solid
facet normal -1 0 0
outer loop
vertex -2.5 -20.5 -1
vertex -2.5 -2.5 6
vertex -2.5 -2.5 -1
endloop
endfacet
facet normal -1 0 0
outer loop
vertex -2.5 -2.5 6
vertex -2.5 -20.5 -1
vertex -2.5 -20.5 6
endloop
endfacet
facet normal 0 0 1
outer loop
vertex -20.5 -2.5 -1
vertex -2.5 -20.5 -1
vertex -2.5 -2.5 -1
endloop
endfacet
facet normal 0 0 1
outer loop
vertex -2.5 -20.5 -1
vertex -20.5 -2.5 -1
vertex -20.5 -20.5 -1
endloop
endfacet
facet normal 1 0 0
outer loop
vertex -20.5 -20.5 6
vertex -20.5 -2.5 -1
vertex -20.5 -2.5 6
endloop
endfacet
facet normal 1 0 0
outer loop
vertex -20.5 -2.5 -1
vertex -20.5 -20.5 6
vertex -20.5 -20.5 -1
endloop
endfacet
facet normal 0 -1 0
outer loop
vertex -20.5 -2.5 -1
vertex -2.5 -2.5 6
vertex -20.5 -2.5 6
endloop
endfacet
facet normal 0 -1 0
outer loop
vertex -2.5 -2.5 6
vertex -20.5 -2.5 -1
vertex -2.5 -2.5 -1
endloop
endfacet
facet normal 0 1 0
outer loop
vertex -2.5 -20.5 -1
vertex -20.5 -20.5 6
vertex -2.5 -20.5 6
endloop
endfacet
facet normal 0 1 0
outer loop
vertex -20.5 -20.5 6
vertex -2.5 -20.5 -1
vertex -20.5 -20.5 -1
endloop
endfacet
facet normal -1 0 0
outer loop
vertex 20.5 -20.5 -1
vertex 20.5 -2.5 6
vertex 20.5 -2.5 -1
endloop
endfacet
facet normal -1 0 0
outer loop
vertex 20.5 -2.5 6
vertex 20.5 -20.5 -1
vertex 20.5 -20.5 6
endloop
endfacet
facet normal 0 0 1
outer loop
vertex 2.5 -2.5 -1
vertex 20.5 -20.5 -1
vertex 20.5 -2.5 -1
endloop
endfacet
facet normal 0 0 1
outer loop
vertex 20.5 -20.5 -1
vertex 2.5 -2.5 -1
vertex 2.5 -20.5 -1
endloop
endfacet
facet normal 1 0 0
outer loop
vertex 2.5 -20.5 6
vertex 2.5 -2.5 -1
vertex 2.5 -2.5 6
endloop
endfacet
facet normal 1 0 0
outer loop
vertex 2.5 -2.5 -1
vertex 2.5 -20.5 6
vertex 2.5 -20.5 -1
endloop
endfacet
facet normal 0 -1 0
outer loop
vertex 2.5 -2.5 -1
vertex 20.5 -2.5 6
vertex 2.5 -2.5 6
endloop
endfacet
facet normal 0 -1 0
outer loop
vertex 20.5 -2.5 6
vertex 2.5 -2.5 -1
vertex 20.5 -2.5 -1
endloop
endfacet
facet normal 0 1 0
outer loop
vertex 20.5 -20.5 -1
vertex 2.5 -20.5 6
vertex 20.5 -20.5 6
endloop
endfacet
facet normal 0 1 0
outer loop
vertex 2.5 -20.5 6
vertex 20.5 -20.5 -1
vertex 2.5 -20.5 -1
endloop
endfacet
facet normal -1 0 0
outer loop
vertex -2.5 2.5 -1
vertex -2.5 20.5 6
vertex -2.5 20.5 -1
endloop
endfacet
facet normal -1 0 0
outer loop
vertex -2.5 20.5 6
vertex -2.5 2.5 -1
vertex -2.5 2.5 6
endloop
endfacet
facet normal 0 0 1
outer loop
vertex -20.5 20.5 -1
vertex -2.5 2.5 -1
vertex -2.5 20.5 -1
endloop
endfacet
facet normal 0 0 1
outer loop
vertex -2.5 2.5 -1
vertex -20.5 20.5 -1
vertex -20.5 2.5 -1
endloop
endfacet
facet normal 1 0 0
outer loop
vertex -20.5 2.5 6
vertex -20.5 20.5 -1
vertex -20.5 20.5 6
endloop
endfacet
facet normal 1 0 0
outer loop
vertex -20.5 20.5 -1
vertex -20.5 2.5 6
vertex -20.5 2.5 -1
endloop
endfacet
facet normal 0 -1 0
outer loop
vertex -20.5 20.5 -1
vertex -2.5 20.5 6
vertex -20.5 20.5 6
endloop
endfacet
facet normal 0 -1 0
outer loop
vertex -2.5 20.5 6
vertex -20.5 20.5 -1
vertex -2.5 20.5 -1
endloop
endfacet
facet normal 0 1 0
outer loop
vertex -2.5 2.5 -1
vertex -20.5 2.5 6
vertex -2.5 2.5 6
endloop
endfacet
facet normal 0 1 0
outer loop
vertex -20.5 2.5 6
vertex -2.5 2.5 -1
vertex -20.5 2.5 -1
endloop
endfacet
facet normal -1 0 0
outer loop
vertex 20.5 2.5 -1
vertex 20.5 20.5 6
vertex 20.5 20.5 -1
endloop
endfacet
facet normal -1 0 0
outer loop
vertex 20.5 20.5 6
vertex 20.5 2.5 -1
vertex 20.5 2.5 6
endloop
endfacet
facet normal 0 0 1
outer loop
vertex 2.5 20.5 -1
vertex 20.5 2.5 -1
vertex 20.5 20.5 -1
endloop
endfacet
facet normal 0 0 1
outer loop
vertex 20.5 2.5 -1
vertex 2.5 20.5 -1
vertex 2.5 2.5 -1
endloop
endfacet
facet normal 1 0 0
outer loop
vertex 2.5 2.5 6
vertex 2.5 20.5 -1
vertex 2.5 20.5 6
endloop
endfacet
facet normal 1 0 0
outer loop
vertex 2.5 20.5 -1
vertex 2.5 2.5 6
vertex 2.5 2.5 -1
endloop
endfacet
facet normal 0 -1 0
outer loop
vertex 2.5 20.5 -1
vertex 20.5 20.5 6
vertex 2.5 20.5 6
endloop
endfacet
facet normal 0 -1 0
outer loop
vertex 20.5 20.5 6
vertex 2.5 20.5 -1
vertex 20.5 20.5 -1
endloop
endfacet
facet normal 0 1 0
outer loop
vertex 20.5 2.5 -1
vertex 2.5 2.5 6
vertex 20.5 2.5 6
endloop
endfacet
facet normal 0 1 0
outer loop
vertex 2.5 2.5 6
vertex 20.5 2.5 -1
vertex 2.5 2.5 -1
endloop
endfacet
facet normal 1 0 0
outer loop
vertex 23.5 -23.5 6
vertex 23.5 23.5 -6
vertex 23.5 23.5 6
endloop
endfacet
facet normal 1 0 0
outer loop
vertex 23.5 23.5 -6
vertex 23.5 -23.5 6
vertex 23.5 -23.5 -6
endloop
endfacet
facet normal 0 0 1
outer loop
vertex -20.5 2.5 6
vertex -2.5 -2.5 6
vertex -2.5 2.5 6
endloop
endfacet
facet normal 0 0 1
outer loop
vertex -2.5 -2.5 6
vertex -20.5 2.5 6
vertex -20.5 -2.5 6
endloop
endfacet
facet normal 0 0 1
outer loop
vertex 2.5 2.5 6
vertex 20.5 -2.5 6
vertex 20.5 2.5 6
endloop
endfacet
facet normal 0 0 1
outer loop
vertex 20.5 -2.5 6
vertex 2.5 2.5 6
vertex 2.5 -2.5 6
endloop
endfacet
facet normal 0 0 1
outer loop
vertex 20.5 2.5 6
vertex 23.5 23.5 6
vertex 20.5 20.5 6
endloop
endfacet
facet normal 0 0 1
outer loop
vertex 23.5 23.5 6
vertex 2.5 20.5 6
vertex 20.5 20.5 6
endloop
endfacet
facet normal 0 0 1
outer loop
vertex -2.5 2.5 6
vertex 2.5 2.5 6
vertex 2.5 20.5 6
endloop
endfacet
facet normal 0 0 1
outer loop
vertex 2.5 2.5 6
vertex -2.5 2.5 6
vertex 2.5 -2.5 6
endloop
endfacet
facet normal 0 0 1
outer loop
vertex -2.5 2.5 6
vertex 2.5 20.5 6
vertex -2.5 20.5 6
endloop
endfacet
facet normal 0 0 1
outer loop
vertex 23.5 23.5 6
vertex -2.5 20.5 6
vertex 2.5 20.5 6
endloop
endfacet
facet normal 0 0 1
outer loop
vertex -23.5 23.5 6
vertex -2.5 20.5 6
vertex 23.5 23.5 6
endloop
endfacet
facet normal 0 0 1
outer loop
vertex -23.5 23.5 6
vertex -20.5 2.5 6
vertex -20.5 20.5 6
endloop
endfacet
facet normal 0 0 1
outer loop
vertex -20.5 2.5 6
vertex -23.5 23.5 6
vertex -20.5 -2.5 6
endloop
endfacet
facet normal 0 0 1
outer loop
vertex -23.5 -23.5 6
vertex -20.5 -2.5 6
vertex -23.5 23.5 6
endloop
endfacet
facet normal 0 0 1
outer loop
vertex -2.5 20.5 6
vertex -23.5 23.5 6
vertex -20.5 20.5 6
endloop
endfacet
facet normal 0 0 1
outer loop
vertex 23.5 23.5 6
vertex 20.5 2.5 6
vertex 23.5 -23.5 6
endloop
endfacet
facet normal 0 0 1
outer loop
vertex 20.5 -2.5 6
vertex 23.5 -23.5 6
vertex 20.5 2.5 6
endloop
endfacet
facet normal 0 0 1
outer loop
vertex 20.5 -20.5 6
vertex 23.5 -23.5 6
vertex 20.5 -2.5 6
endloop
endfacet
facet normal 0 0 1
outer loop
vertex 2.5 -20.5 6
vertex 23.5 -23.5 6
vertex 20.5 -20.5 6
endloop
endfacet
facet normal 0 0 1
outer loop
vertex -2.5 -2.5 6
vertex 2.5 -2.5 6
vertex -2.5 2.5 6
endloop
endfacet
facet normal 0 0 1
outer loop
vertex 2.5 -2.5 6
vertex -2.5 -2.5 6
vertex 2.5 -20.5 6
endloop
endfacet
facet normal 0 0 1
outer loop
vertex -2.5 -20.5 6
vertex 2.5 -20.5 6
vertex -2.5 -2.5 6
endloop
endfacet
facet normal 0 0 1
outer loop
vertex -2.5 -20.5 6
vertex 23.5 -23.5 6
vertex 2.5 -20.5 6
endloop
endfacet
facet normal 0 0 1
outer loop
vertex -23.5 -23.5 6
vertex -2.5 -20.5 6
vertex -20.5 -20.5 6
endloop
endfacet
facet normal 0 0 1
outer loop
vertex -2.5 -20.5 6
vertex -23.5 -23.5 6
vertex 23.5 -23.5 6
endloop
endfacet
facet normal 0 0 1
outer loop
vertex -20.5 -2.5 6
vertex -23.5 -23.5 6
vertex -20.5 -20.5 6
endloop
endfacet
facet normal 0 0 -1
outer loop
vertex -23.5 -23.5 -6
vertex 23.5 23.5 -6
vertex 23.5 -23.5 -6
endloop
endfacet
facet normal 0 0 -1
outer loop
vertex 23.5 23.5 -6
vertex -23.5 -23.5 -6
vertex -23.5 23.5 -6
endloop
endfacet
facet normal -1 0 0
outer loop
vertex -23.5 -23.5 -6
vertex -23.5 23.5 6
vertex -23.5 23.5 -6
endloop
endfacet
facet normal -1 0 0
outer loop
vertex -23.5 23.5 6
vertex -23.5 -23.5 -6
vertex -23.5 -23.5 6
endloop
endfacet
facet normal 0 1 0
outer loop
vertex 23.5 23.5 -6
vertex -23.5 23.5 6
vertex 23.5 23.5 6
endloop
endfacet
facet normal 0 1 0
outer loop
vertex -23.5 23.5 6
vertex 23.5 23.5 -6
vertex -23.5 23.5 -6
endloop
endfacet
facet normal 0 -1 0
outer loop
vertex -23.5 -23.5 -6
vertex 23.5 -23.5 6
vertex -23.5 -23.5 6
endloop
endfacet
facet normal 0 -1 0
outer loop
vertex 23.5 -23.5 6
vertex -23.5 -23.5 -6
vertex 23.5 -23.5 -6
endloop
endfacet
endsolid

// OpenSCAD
$fn = 32;

// ----------------------------------------------------------------------
// Pocket plate 47 x 47 x 12
// 2 x 2 pockets 18 mm square, 7 mm deep
// ----------------------------------------------------------------------

// --- parameters (mm) ---
thickness = 12;  // plate thickness
floor_t = 5;     // material left under each pocket
pocket = 18;     // pocket side length
pitch_x = 23;    // pocket pitch along X
pitch_y = 23;    // pocket pitch along Y
cols = 2;        // pockets per row
rows = 2;        // rows of pockets

// --- derived feature positions (mm) ---
depth = thickness - floor_t;        // = 7   pocket depth, down to the floor
span_x = (cols - 1) * pitch_x;      // = 23   distance between outer pockets
span_y = (rows - 1) * pitch_y;      // = 23   distance between outer pocket rows
origin_x = -span_x / 2;             // = -11.5   X of the first pocket
origin_y = -span_y / 2;             // = -11.5   Y of the first pocket
plate = [span_x + pocket + 6, span_y + pocket + 6, thickness];  // = [47, 47, 12]   overall size: pockets plus 3 mm of wall on each side
feature_centers = [
  [origin_x + 0 * pitch_x, origin_y + 0 * pitch_y],
  [origin_x + 1 * pitch_x, origin_y + 0 * pitch_y],
  [origin_x + 0 * pitch_x, origin_y + 1 * pitch_y],
  [origin_x + 1 * pitch_x, origin_y + 1 * pitch_y]
];   // pocket centres, used verbatim by the cutter loop

// plate outline, then one pocket per centre in feature_centers
difference() {
  cube(plate, center = true);
  for (centre = feature_centers)
    translate([centre[0] - pocket / 2, centre[1] - pocket / 2, plate[2] / 2 - depth])
      cube([pocket, pocket, depth + 1]);  // centred on the declared pocket centre
}
